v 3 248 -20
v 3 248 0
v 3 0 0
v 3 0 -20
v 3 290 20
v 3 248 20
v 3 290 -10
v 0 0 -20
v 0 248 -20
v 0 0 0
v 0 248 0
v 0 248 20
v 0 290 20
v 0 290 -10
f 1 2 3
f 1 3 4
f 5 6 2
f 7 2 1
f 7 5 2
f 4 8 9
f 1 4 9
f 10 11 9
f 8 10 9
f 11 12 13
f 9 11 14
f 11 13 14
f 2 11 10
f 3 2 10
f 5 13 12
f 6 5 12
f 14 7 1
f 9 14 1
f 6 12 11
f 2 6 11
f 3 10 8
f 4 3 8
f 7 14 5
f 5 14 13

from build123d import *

# Parameters (mm, degrees)
EXTRUDE_1_DEPTH     = 3
CUT_EXTRUDE_1_DEPTH = 3


with BuildPart() as part:
    # 스케치1 → 보스-돌출1 (new body)
    with BuildSketch(Plane(origin=(0, 0, 0), x_dir=(0, 0, -1), z_dir=(1, 0, 0))):
        Polygon((0, 0), (20, 0), (20, 290), (-20, 290), (-20, 248), (0, 248), align=None)
    extrude(amount=EXTRUDE_1_DEPTH)

    # 스케치2 → 컷-돌출1 (cut)
    with BuildSketch(Plane(origin=(3, 0, 0), x_dir=(0, 0, -1), z_dir=(1, 0, 0))):
        Polygon((10, 290), (20, 248), (20, 290), align=None)
    extrude(amount=-CUT_EXTRUDE_1_DEPTH, mode=Mode.SUBTRACT)


solid = part.part
